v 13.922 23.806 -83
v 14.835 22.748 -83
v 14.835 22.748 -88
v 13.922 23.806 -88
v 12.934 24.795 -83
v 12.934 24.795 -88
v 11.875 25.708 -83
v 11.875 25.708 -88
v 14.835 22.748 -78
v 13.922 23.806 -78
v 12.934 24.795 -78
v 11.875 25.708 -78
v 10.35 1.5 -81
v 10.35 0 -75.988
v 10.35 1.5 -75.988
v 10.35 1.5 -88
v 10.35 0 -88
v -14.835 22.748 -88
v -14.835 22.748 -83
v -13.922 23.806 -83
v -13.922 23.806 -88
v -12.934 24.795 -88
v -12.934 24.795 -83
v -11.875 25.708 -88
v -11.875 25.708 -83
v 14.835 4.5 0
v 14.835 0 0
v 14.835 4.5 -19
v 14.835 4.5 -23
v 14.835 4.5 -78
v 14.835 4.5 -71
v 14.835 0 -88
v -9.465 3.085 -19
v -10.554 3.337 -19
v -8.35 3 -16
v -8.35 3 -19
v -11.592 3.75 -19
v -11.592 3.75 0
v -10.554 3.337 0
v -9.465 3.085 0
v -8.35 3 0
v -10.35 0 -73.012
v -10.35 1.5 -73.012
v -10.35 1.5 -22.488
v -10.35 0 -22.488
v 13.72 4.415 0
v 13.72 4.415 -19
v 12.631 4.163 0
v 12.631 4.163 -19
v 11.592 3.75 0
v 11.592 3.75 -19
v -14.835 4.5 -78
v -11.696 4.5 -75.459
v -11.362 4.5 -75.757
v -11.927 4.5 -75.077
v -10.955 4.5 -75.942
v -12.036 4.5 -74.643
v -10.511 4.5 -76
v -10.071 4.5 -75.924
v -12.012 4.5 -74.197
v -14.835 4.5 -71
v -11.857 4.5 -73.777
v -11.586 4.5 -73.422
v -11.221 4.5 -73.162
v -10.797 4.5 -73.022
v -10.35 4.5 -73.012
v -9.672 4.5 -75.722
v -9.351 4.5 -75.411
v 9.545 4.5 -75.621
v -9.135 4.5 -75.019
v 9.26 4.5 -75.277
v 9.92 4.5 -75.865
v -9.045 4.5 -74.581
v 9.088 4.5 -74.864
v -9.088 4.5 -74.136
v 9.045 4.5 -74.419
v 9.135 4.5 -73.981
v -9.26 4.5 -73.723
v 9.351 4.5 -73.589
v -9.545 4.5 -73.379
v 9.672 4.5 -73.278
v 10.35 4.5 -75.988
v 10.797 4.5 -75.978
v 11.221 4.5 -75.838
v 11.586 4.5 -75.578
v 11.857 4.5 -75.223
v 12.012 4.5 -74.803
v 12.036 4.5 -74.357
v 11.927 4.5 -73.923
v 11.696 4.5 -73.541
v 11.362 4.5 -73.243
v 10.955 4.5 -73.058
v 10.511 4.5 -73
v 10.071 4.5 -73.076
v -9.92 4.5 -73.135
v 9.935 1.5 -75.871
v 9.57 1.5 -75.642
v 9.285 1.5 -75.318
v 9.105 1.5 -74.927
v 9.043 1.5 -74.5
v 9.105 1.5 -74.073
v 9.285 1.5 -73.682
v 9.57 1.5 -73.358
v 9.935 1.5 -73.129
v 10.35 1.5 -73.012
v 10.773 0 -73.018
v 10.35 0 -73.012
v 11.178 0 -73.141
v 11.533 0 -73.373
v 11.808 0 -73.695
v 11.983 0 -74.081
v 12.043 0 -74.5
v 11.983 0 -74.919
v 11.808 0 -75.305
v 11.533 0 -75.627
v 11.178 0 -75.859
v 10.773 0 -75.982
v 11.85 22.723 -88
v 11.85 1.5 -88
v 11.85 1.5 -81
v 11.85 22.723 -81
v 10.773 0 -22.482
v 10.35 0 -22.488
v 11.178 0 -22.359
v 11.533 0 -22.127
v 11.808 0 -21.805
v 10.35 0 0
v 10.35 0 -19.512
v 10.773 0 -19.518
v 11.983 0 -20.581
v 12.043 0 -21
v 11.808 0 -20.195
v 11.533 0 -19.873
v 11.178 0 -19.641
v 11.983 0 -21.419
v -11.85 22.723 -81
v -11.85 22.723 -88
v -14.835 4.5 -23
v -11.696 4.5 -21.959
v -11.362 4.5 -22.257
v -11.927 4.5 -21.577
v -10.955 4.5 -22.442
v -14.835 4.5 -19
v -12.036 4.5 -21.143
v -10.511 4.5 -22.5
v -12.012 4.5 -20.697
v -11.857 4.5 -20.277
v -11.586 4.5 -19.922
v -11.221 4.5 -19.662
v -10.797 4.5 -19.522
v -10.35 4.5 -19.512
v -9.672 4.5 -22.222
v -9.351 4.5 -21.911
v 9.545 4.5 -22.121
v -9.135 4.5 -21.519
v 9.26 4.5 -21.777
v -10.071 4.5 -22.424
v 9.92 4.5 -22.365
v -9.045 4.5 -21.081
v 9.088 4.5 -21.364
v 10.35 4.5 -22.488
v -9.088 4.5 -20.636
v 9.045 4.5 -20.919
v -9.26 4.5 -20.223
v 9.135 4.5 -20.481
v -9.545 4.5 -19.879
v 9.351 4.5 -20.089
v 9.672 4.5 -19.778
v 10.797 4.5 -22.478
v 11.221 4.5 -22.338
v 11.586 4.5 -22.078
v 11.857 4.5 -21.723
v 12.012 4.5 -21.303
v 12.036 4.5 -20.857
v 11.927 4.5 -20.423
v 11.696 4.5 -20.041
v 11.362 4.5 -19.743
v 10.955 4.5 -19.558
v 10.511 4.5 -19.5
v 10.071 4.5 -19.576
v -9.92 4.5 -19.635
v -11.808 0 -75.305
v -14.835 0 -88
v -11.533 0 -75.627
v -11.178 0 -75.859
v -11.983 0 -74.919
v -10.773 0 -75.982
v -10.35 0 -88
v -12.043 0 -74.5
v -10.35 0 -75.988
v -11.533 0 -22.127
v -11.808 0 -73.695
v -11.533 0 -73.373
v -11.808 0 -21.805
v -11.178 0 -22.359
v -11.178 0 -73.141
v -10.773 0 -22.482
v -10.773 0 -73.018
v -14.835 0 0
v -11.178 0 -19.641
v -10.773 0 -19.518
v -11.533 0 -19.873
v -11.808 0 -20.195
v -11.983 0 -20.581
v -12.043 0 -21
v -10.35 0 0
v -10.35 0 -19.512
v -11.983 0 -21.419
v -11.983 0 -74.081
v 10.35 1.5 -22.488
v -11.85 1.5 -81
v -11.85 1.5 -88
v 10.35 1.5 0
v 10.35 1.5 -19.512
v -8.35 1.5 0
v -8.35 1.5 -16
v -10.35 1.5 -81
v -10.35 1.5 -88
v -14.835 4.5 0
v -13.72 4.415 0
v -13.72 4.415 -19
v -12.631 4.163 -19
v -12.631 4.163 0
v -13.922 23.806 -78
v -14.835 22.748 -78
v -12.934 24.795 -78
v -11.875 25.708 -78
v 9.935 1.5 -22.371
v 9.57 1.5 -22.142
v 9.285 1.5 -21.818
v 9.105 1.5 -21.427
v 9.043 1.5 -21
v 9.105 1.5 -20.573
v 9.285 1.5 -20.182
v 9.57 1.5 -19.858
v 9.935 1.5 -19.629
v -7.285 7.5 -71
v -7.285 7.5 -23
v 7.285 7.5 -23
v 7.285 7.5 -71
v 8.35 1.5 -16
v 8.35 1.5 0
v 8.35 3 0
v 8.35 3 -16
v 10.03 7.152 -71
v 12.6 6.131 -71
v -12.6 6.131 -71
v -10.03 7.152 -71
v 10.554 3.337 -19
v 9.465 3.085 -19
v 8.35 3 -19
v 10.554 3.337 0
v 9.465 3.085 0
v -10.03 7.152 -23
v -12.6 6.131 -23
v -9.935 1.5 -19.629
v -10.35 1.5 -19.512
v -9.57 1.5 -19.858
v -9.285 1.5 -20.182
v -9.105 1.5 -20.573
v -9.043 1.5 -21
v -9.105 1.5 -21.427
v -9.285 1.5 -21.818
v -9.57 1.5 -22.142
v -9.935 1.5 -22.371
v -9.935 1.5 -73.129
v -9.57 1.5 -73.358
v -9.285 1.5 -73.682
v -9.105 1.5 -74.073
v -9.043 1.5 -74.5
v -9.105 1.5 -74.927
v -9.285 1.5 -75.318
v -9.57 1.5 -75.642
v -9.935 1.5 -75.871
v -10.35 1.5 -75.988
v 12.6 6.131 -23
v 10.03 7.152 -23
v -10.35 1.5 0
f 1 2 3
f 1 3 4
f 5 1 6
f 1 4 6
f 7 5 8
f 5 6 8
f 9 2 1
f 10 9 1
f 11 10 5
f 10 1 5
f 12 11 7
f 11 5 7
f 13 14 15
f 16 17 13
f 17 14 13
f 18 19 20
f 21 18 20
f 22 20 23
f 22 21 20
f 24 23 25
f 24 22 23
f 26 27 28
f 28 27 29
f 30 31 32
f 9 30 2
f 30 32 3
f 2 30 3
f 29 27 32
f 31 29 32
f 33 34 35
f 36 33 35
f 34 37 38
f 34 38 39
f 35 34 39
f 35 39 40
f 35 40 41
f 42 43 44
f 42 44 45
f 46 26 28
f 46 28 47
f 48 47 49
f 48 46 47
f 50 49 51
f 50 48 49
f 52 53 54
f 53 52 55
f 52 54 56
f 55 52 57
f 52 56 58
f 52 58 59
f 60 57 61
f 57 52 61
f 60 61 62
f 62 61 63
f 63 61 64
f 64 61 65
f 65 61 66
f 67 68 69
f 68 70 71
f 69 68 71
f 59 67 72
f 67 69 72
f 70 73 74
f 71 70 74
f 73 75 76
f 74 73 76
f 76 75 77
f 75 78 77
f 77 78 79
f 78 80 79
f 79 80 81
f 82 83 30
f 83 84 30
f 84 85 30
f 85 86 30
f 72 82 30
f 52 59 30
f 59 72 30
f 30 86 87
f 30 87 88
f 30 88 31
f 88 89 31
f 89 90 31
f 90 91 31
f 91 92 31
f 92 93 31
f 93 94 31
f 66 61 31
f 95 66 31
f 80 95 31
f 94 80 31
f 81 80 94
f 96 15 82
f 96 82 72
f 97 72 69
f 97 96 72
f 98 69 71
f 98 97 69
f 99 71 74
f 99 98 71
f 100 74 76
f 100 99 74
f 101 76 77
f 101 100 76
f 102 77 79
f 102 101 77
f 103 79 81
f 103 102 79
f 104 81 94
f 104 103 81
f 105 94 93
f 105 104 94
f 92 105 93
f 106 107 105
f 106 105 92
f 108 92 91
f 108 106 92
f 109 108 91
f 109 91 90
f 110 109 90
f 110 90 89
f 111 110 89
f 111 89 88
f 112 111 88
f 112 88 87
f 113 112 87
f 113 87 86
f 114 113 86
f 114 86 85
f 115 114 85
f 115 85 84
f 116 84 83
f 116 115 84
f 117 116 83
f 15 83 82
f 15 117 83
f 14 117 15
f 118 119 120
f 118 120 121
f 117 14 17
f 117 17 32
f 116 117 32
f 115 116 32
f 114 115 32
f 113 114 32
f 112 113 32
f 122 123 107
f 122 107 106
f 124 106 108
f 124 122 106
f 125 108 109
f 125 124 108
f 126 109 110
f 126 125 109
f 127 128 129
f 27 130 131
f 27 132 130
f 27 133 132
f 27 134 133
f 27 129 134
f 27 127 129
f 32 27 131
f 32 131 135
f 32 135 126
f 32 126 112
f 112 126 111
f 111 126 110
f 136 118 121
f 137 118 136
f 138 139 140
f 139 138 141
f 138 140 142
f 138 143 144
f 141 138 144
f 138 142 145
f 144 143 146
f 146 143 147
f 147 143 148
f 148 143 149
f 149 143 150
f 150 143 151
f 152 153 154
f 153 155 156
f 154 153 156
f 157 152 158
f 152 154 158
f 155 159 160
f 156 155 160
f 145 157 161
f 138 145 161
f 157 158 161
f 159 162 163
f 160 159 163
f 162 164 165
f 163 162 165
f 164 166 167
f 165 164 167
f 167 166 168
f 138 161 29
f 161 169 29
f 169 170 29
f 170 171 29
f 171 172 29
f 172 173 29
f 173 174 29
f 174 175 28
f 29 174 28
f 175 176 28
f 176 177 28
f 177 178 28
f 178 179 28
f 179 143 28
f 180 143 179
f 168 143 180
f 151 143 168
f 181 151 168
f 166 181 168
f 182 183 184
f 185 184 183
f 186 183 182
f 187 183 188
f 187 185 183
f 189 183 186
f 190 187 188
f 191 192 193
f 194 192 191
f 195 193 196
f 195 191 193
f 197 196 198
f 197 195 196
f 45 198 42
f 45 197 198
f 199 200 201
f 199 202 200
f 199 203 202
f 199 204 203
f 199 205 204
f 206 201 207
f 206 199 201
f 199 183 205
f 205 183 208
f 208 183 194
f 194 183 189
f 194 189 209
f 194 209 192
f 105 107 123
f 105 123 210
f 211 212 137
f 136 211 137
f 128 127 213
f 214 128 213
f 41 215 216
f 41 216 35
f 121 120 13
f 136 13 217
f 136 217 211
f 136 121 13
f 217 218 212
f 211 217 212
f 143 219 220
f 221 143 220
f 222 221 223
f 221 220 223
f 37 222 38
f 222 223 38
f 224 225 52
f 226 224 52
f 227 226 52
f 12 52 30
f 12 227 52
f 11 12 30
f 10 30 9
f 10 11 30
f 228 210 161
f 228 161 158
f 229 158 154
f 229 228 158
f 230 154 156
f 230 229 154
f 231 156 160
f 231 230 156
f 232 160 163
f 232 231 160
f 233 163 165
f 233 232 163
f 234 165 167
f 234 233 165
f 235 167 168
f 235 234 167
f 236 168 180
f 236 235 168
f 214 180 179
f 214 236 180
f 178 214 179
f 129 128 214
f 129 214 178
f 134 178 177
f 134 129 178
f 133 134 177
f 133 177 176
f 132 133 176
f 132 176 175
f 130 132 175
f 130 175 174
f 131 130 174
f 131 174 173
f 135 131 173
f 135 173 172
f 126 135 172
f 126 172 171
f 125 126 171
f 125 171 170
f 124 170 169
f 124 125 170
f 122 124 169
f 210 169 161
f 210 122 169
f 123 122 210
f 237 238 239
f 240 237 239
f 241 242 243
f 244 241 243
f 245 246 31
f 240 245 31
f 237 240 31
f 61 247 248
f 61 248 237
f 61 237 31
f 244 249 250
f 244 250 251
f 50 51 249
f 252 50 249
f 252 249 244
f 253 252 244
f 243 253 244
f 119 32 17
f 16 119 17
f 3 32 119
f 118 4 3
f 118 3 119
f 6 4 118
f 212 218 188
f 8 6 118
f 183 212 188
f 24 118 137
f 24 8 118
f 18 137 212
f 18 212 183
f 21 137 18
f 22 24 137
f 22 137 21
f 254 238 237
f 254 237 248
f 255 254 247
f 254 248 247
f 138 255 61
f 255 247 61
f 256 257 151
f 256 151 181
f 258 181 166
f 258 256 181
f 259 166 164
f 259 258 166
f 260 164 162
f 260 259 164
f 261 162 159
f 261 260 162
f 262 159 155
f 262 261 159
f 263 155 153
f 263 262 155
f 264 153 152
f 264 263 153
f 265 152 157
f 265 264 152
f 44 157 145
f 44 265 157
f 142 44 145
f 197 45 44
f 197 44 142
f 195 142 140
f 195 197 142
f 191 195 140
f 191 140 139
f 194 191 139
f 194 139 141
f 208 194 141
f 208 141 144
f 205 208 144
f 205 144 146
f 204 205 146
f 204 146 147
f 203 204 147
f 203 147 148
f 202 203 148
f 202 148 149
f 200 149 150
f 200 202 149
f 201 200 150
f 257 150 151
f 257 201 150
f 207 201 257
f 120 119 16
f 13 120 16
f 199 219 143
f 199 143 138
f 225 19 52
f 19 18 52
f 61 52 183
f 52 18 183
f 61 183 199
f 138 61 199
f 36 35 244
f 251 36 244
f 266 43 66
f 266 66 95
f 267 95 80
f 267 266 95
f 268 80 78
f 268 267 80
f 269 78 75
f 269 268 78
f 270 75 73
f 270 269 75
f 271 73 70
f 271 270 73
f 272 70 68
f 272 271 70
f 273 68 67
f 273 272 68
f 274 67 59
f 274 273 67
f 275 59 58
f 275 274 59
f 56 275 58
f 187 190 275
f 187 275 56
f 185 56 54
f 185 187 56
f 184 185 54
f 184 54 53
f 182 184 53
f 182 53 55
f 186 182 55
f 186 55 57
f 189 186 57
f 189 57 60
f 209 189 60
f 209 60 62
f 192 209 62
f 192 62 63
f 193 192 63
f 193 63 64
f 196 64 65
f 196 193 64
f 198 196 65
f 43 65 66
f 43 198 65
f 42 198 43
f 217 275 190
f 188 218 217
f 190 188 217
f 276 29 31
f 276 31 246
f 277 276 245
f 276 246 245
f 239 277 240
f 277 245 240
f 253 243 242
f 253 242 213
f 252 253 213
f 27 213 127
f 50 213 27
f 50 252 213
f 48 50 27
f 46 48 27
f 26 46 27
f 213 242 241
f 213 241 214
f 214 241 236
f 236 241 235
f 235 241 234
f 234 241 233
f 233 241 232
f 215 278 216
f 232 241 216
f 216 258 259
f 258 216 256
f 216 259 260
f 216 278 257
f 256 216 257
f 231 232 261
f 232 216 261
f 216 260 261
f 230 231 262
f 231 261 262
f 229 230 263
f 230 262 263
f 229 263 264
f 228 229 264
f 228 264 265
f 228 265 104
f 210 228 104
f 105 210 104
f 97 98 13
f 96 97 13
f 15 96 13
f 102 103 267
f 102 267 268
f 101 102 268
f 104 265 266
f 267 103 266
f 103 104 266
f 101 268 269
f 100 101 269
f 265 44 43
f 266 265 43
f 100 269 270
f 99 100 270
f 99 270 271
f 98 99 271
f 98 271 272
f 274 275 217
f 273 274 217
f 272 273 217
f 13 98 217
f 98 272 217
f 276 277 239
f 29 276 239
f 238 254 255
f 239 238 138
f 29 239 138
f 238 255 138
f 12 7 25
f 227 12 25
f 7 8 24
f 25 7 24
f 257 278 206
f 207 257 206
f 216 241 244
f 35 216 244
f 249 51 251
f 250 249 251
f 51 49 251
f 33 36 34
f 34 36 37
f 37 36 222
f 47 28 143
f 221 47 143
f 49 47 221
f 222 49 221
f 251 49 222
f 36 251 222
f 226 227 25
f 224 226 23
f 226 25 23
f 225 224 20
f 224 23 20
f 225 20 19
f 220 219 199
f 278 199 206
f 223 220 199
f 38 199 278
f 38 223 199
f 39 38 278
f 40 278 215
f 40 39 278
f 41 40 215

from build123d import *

# Parameters (mm, degrees)
SKETCH1_W               = 6.485
SKETCH1_H               = 4.5
BOSS_EXTRUDE1_DEPTH     = 88
BOSS_EXTRUDE1_2_DEPTH   = 88
SKETCH3_W               = 2
SKETCH3_H               = 1.5
CUT_EXTRUDE2_DEPTH      = 30
SKETCH4_W               = 2
SKETCH4_H               = 4.5
CUT_EXTRUDE3_DEPTH      = 65
BOSS_EXTRUDE2_REACH     = 93.644
SKETCH6_W               = 67
SKETCH6_H               = 3
BOSS_EXTRUDE3_DEPTH     = 5
CUT_EXTRUDE4_DEPTH      = 5
BOSS_EXTRUDE4_DEPTH     = 5
BOSS_EXTRUDE5_START     = 7
BOSS_EXTRUDE5_DEPTH     = 48
BOSS_EXTRUDE6_DEPTH     = 48
FILLET1_R               = 11
SKETCH15_W              = 23.7
SKETCH15_H              = 21.22267295
CUT_EXTRUDE6_DEPTH      = 7
SKETCH16_W              = 16.7
SKETCH16_H              = 1.5
CUT_EXTRUDE7_DEPTH      = 19
CUT_EXTRUDE5_DEPTH      = 92.727000479
CUT_EXTRUDE5_DEPTH_BACK = 92.727000479
SKETCH13_R              = 1.5


with BuildPart() as part:
    # Sketch1 → Boss-Extrude1 (new body)
    with BuildSketch(Plane.XY):
        with Locations((-11.5925, 2.25)):
            Rectangle(SKETCH1_W, SKETCH1_H)
    extrude(amount=-BOSS_EXTRUDE1_DEPTH)


with BuildPart() as body_2:
    # Sketch1 → Boss-Extrude1 2 (new body)
    with BuildSketch(Plane.XY):
        with Locations((11.5925, 2.25)):
            Rectangle(SKETCH1_W, SKETCH1_H)
    extrude(amount=-BOSS_EXTRUDE1_2_DEPTH)


with BuildPart() as cut_extrude2_tool:
    # Sketch3 → Cut-Extrude2 (new body)
    with BuildSketch(Plane.XY):
        with Locations((-9.35, 0.75)):
            Rectangle(SKETCH3_W, SKETCH3_H)
        with Locations((9.35, 0.75)):
            Rectangle(SKETCH3_W, SKETCH3_H)
    extrude(amount=-CUT_EXTRUDE2_DEPTH)


with BuildPart() as part_1:
    add(part.part)

    # Cut-Extrude2: cut by cut_extrude2_tool
    add(cut_extrude2_tool.part, mode=Mode.SUBTRACT)


with BuildPart() as body_2_1:
    add(body_2.part)

    # Cut-Extrude2: cut by cut_extrude2_tool
    add(cut_extrude2_tool.part, mode=Mode.SUBTRACT)


with BuildPart() as cut_extrude3_tool:
    # Sketch4 → Cut-Extrude3 (new body)
    with BuildSketch(Plane(origin=(0, 0, -88), x_dir=(-1, 0, 0), z_dir=(0, 0, -1))):
        with Locations((9.35, 2.25)):
            Rectangle(SKETCH4_W, SKETCH4_H)
        with Locations((-9.35, 2.25)):
            Rectangle(SKETCH4_W, SKETCH4_H)
    extrude(amount=-CUT_EXTRUDE3_DEPTH)


with BuildPart() as part_2:
    add(part_1.part)

    # Cut-Extrude3: cut by cut_extrude3_tool
    add(cut_extrude3_tool.part, mode=Mode.SUBTRACT)


with BuildPart() as body_2_2:
    add(body_2_1.part)

    # Cut-Extrude3: cut by cut_extrude3_tool
    add(cut_extrude3_tool.part, mode=Mode.SUBTRACT)

    # Boss-Extrude2: up to this face of the body (flat: up to its plane)
    boss_extrude2_end = Plane(body_2_2.part.faces().sort_by_distance((10.35, 2.091743119, -50.857798165))[0])
    # Sketch6 → Boss-Extrude2 (add, up to the picked face)
    with BuildSketch(Plane(origin=(-10.35, 0, 0), x_dir=(0, 0, -1), z_dir=(1, 0, 0)), mode=Mode.PRIVATE) as boss_extrude2_sk1:
        with Locations((49.5, 3)):
            Rectangle(SKETCH6_W, SKETCH6_H)
    boss_extrude2_tool1 = split(extrude(boss_extrude2_sk1.sketch, amount=BOSS_EXTRUDE2_REACH, mode=Mode.PRIVATE), bisect_by=boss_extrude2_end, keep=Keep.BOTH, mode=Mode.PRIVATE)

    add(part_2.part)  # Boss-Extrude2 merges part
    add(boss_extrude2_tool1.solids().sort_by(Axis((-10.35, 3, -49.5), (1, 0, 0)))[0])

    # Sketch8 → Boss-Extrude3 (add)
    with BuildSketch(Plane(origin=(0, 0, -88), x_dir=(-1, 0, 0), z_dir=(0, 0, -1))):
        Polygon((-14.835, 25.70767295), (-14.835, 4.5), (-10.35, 4.5), (-10.35, 21.22267295), (10.35, 21.22267295), (10.35, 4.5), (14.835, 4.5), (14.835, 25.70767295), align=None)
    extrude(amount=-BOSS_EXTRUDE3_DEPTH)

    # Sketch9 → Cut-Extrude4 (cut)
    with BuildSketch(Plane(origin=(0, 0, -88), x_dir=(-1, 0, 0), z_dir=(0, 0, -1))):
        with BuildLine():
            Line((-15.009070225, 25.881743175), (-15.009070225, 22.527310239))
            ThreePointArc((-15.009070225, 22.527310239), (-13.436955933, 24.309628883), (-11.654637289, 25.881743175))
            Line((-11.654637289, 25.881743175), (-15.009070225, 25.881743175))
        make_face()
        with BuildLine():
            Line((15.009070225, 25.881743175), (15.009070225, 22.527310239))
            ThreePointArc((15.009070225, 22.527310239), (13.436955933, 24.309628883), (11.654637289, 25.881743175))
            Line((11.654637289, 25.881743175), (15.009070225, 25.881743175))
        make_face()
    extrude(amount=-CUT_EXTRUDE4_DEPTH, mode=Mode.SUBTRACT)

    # Sketch11 → Boss-Extrude4 (add)
    with BuildSketch(Plane.XY.offset(-83)):
        with BuildLine():
            Line((14.835, 4.5), (14.835, 22.748097759))
            ThreePointArc((14.835, 22.748097759), (13.436955933, 24.309628883), (11.875424809, 25.70767295))
            Line((11.875424809, 25.70767295), (-11.875424809, 25.70767295))
            ThreePointArc((-11.875424809, 25.70767295), (-13.436955933, 24.309628883), (-14.835, 22.748097759))
            Line((-14.835, 22.748097759), (-14.835, 4.5))
            Line((-14.835, 4.5), (14.835, 4.5))
        make_face()
    extrude(amount=BOSS_EXTRUDE4_DEPTH)

    # Sketch12 → Boss-Extrude5 (add)
    with BuildSketch(Plane.XY.offset(-78).offset(BOSS_EXTRUDE5_START)):
        Polygon((-14.835, 4.5), (-11.835, 7.5), (11.835, 7.5), (14.835, 4.5), align=None)
    extrude(amount=BOSS_EXTRUDE5_DEPTH)

    # Sketch14 → Boss-Extrude6 (add)
    with BuildSketch(Plane.XY.offset(-23)):
        Polygon((-11.835, 7.5), (-14.835, 4.5), (-10.835, 4.5), (-10.835, 7.5), align=None)
        Polygon((11.835, 7.5), (14.835, 4.5), (10.835, 4.5), (10.835, 7.5), align=None)
    extrude(amount=-BOSS_EXTRUDE6_DEPTH)

    # Fillet1
    # the kernel refuses this fillet: 11 mm, written as the material it takes off along each edge
    with BuildSketch(Plane(origin=(11.835, 7.5, -82.374586088), x_dir=(-1, 0, 0), z_dir=(0, 0, 1))) as fillet1_piece_1_section:
        with BuildLine():
            CenterArc((4.549834435, 11), FILLET1_R, 226.658241773, 43.341758227)
            Line((-3, 3), (0, 0))
            Line((0, 0), (4.549834435, 0))
        make_face()
    fillet1_piece_1 = extrude(amount=70.749172176, mode=Mode.PRIVATE)
    fillet1_piece_1 = split(fillet1_piece_1, bisect_by=Plane(origin=(11.355308805, 6.742969198, -78), z_dir=(0, 0, 1)), keep=Keep.TOP, mode=Mode.PRIVATE)
    add(fillet1_piece_1, mode=Mode.SUBTRACT)
    with BuildSketch(Plane(origin=(-11.835, 7.5, -82.374586088), x_dir=(1, 0, 0), z_dir=(0, 0, 1))) as fillet1_piece_2_section:
        with BuildLine():
            CenterArc((4.549834435, -11), FILLET1_R, 90, 43.341758227)
            Line((-3, -3), (0, 0))
            Line((0, 0), (4.549834435, 0))
        make_face()
    fillet1_piece_2 = extrude(amount=70.749172176, mode=Mode.PRIVATE)
    fillet1_piece_2 = split(fillet1_piece_2, bisect_by=Plane(origin=(-11.355308805, 6.742969198, -78), z_dir=(0, 0, 1)), keep=Keep.TOP, mode=Mode.PRIVATE)
    add(fillet1_piece_2, mode=Mode.SUBTRACT)

    # Sketch15 → Cut-Extrude6 (cut)
    with BuildSketch(Plane(origin=(0, 0, -88), x_dir=(-1, 0, 0), z_dir=(0, 0, -1))):
        with Locations((0, 12.111336475)):
            Rectangle(SKETCH15_W, SKETCH15_H)
    extrude(amount=-CUT_EXTRUDE6_DEPTH, mode=Mode.SUBTRACT)

    # Sketch16 → Cut-Extrude7 (cut)
    with BuildSketch(Plane.XY):
        with BuildLine():
            ThreePointArc((11.5925, 3.75), (10.014054255, 3.189942939), (8.35, 3))
            Line((8.35, 3), (8.35, 4.5))
            Line((8.35, 4.5), (14.835, 4.5))
            ThreePointArc((14.835, 4.5), (13.170945745, 4.310057061), (11.5925, 3.75))
        make_face()
        with BuildLine():
            ThreePointArc((-11.5925, 3.75), (-10.014054255, 3.189942939), (-8.35, 3))
            Line((-8.35, 3), (-8.35, 4.5))
            Line((-8.35, 4.5), (-14.835, 4.5))
            ThreePointArc((-14.835, 4.5), (-13.170945745, 4.310057061), (-11.5925, 3.75))
        make_face()
        with Locations((0, 3.75)):
            Rectangle(SKETCH16_W, SKETCH16_H)
    extrude(amount=-CUT_EXTRUDE7_DEPTH, mode=Mode.SUBTRACT)

    # Sketch13 → Cut-Extrude5 (cut, two sides: drawn at the far end of the back side and taken through both)
    with BuildSketch(Plane(origin=(0, 4.5, 0), x_dir=(1, 0, 0), z_dir=(0, 1, 0)).offset(-CUT_EXTRUDE5_DEPTH_BACK)):
        with Locations(Location((10.542662348, 74.5, 0), (0, 0, 97.379545614))):
            Circle(SKETCH13_R)
        with Locations(Location((-10.542662348, 74.5, 0), (0, 0, 277.379545614))):
            Circle(SKETCH13_R)
        with Locations(Location((10.542662348, 21, 0), (0, 0, 97.379545614))):
            Circle(SKETCH13_R)
        with Locations(Location((-10.542662348, 21, 0), (0, 0, 277.379545614))):
            Circle(SKETCH13_R)
    extrude(amount=CUT_EXTRUDE5_DEPTH + CUT_EXTRUDE5_DEPTH_BACK, mode=Mode.SUBTRACT)


solid = body_2_2.part
